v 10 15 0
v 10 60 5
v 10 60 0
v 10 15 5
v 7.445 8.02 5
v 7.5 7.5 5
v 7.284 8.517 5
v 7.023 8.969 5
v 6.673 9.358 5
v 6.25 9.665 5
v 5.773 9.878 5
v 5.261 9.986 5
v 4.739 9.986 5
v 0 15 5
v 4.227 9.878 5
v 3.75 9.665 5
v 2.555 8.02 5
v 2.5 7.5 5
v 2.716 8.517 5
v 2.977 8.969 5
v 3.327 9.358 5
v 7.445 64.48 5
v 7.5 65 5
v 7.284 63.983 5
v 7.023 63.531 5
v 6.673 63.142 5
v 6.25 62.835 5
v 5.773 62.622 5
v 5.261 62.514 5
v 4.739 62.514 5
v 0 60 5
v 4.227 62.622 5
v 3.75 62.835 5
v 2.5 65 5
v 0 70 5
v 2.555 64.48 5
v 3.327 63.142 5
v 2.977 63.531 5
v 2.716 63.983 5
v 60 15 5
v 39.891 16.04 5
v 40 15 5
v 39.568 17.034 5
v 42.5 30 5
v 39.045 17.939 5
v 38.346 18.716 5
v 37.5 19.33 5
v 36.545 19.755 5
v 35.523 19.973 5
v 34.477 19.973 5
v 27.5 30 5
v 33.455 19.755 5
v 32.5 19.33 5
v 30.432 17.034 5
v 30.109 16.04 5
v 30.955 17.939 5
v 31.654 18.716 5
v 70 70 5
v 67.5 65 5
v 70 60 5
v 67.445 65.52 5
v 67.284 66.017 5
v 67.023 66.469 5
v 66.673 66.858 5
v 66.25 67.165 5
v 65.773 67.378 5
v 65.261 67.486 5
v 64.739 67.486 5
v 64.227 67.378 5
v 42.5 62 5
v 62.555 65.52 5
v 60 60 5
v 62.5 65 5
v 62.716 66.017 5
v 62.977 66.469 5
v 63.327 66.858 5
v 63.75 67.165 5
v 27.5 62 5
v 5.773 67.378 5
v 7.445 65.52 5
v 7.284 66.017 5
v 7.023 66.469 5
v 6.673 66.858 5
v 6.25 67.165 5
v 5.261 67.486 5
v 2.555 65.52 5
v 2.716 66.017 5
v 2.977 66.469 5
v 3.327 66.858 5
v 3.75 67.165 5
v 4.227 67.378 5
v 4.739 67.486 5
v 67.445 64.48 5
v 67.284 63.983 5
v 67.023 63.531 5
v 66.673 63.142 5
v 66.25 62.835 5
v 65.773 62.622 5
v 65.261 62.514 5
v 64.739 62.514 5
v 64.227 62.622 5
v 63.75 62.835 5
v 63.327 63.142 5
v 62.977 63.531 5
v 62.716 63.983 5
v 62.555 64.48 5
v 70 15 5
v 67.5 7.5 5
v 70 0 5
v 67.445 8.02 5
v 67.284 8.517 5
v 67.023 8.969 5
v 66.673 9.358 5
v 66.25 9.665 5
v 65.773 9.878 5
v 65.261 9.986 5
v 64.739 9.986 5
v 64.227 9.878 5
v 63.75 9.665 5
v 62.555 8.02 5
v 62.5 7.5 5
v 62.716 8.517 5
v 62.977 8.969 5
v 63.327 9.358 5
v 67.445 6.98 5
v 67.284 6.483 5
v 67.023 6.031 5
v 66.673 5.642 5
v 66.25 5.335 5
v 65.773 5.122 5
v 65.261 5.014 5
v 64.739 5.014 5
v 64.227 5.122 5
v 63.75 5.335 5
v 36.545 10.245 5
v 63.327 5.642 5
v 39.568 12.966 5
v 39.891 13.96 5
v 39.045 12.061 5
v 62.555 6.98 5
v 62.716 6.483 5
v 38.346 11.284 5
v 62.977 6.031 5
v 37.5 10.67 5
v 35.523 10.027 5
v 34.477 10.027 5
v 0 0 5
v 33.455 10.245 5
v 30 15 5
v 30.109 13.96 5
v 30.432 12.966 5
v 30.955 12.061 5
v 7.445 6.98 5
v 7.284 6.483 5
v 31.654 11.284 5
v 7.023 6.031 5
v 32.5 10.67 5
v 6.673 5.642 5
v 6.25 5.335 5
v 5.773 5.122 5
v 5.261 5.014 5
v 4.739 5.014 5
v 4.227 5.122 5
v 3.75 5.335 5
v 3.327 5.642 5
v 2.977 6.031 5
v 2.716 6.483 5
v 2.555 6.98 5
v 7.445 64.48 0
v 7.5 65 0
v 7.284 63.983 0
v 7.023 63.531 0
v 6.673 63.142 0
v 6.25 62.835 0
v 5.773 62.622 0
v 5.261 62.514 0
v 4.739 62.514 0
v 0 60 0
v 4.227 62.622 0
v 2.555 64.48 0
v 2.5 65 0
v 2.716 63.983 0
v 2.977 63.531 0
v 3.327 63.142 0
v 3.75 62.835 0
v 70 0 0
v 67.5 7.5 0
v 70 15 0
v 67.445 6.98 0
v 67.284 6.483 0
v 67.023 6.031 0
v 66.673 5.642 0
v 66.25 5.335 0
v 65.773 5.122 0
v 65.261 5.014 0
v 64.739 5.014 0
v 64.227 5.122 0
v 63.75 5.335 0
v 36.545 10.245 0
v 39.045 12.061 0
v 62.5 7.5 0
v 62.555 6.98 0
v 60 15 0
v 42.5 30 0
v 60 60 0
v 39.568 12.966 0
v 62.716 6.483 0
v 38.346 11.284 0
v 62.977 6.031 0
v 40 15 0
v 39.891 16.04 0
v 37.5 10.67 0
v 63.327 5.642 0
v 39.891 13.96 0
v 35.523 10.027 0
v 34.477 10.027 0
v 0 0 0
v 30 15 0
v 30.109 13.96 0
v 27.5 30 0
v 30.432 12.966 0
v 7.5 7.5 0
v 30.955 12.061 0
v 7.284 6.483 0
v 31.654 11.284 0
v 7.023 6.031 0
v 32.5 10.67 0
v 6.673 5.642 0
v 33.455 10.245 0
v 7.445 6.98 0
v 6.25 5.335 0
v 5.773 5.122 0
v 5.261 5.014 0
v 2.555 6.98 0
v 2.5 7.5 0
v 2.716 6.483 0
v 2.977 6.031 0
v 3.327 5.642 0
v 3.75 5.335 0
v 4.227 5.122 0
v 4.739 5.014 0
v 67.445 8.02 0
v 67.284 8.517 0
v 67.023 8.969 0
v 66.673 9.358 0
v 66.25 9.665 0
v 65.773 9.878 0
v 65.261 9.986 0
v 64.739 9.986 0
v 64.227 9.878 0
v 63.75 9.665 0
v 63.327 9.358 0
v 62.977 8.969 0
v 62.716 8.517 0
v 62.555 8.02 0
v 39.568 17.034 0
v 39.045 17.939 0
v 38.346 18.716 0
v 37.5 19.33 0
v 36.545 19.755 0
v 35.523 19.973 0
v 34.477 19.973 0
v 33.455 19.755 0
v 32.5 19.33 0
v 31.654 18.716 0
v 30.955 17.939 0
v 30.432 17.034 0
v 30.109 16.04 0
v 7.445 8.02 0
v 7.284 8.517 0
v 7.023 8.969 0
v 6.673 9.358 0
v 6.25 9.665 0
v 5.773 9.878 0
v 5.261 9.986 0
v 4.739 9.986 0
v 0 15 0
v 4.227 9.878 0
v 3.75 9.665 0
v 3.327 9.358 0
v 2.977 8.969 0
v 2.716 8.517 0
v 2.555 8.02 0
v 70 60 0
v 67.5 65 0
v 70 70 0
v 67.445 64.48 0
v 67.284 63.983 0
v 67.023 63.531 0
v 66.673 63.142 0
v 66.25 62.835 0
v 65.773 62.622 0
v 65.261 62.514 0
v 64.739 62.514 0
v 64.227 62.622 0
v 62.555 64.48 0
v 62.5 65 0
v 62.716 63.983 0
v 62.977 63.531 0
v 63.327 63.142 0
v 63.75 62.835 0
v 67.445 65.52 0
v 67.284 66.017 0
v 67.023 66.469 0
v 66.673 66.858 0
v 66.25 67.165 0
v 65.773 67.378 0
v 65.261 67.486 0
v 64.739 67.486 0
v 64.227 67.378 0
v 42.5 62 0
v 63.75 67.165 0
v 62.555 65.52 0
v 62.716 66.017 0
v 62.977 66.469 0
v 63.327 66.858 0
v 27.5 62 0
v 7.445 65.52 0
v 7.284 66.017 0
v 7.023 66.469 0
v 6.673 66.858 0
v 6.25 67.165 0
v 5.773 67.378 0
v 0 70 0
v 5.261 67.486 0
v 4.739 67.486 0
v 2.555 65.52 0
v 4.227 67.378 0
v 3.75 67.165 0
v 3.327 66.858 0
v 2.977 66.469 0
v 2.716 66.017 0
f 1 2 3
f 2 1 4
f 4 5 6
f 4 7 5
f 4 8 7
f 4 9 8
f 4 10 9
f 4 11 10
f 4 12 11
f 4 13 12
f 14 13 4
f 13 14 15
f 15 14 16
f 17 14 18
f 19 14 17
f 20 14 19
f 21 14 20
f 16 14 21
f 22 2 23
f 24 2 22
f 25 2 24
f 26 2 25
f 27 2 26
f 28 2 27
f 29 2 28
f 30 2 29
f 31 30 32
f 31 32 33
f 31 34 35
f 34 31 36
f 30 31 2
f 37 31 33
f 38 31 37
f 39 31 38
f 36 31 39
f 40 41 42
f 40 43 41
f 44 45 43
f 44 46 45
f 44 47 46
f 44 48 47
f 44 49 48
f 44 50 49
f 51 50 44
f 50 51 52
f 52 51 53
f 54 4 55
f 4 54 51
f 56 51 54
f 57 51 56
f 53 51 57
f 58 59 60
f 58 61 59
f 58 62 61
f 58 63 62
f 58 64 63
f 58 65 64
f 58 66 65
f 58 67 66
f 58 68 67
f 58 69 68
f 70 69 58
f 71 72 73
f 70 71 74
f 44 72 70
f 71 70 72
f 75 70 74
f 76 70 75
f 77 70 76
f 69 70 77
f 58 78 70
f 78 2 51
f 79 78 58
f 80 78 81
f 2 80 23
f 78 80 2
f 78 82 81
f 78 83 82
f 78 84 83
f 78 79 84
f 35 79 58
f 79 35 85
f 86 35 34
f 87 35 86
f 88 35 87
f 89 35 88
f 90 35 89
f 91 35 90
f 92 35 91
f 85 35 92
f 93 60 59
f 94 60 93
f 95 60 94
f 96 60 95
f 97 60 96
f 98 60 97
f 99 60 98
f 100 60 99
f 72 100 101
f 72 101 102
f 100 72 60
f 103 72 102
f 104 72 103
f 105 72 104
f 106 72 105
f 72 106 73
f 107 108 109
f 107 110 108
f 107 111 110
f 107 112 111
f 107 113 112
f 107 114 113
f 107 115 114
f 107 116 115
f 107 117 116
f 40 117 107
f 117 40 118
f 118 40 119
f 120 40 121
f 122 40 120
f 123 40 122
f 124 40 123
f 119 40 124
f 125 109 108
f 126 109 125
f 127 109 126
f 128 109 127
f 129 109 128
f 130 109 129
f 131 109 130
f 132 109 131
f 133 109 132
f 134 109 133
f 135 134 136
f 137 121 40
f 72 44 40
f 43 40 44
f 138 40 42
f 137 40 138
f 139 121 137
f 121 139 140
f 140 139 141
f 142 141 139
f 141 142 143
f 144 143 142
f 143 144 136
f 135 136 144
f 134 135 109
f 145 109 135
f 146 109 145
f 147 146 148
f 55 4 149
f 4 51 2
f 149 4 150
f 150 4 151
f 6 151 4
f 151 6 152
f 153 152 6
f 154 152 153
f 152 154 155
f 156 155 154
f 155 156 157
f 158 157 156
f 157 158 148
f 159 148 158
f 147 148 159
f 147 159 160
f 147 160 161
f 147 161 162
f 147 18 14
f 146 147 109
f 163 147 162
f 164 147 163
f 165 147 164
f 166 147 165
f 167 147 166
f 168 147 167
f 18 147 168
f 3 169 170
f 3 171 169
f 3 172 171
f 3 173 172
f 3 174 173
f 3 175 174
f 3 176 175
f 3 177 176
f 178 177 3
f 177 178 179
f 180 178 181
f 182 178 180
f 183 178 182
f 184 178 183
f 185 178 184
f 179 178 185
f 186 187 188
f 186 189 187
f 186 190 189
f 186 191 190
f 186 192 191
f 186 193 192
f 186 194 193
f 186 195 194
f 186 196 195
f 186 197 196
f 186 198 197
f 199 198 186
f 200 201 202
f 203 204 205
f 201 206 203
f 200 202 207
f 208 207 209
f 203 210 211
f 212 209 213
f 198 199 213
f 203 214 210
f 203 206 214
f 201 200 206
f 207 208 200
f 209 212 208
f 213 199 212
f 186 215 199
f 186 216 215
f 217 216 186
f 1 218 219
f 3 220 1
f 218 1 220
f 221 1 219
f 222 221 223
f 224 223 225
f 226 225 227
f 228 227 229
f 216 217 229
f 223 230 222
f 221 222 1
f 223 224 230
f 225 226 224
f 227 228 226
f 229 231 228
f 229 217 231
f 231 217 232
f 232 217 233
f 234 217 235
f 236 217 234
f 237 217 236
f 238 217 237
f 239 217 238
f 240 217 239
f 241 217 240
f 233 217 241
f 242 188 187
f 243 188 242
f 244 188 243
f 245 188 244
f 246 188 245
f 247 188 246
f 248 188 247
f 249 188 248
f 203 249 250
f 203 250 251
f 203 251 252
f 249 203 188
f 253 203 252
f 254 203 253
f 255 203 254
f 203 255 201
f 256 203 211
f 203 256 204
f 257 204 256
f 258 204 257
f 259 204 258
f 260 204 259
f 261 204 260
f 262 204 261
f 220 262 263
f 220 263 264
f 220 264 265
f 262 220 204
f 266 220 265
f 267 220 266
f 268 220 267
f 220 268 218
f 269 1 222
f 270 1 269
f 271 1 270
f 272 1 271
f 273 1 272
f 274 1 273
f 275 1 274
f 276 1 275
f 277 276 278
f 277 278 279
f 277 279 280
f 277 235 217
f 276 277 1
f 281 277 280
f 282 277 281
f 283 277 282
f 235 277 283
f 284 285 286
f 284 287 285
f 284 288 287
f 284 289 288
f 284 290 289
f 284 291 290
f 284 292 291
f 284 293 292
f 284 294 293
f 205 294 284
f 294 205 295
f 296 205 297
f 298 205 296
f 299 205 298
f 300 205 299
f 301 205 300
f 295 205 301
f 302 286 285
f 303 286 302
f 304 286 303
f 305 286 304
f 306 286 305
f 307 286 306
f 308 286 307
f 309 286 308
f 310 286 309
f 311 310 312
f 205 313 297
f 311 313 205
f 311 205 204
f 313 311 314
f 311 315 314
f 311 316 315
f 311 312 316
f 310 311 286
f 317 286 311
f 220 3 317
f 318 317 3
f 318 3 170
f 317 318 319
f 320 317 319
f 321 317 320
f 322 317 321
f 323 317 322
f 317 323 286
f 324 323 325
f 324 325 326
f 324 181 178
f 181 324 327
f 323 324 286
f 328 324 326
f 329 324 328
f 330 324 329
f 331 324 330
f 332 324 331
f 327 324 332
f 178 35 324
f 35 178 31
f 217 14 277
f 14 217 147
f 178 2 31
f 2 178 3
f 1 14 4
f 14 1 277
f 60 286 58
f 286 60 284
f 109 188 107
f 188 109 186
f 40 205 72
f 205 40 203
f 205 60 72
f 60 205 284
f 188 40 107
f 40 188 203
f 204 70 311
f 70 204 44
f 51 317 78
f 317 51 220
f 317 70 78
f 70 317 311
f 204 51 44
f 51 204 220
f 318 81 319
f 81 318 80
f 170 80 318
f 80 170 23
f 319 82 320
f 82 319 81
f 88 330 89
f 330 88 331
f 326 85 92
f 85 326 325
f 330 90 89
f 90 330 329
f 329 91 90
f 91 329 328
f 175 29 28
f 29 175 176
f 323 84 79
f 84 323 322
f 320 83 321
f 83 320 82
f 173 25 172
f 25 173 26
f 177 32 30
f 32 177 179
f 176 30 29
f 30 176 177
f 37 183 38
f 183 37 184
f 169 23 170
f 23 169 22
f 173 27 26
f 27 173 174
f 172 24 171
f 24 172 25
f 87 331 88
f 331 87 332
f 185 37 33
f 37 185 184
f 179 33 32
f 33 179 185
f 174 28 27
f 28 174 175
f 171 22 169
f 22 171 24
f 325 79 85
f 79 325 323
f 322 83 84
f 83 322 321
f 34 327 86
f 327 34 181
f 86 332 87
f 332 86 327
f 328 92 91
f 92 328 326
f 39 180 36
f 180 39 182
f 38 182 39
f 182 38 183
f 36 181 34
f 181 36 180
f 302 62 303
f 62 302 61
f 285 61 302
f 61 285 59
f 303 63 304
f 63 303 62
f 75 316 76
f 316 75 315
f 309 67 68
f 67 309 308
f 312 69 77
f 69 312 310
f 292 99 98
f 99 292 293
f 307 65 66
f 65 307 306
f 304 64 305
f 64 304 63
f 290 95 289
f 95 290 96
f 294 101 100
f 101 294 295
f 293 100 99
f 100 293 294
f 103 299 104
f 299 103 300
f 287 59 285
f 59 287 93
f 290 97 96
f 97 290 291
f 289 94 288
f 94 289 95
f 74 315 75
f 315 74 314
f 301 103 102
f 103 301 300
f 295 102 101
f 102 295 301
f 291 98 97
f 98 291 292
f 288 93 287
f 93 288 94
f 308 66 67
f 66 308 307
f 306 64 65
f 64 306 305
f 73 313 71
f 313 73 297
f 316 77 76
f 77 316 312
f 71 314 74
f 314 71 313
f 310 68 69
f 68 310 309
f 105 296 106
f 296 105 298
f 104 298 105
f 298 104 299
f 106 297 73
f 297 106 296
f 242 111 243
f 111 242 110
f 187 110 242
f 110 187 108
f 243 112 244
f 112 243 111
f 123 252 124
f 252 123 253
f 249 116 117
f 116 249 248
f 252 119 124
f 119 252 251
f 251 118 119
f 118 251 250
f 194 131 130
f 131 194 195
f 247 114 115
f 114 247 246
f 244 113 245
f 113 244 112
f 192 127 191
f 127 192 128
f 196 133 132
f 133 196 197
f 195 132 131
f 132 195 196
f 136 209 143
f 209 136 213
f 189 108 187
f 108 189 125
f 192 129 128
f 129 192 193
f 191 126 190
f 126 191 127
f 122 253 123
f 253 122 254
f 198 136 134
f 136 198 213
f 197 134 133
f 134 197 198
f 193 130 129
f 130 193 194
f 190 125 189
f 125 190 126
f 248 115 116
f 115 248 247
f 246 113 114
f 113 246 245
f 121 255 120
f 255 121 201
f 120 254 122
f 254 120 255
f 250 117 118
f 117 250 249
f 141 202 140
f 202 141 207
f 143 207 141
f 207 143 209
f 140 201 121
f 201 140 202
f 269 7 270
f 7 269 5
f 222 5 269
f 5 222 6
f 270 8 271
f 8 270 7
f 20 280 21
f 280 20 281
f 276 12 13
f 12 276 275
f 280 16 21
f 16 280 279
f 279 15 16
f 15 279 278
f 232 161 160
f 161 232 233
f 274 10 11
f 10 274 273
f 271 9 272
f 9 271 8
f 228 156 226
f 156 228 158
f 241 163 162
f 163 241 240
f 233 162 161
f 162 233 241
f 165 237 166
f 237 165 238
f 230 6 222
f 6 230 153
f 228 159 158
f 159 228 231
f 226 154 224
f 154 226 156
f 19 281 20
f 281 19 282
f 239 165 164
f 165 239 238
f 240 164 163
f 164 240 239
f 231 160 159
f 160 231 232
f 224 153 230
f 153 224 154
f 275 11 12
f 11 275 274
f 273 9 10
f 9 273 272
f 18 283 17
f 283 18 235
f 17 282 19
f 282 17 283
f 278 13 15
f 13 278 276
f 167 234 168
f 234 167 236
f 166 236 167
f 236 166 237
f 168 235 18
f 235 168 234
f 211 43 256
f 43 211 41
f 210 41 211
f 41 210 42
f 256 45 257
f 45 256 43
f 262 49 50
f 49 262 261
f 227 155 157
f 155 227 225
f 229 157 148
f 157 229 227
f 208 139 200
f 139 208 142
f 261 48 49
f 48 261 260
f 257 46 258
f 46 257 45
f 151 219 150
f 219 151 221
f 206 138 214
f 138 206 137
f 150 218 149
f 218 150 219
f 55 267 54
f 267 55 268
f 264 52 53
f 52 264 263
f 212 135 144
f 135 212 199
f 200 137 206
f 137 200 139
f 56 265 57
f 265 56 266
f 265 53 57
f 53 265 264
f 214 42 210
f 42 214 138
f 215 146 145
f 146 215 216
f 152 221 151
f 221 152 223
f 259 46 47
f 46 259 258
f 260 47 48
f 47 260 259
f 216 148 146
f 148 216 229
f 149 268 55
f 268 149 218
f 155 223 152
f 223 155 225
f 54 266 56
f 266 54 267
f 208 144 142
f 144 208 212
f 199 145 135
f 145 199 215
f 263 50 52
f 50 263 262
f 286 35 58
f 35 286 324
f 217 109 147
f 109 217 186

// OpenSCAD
$fn = 30; // number of faces in screw holes

thickness = 5; // thickness, this doesnt work

// main body
width = 70;
depth = 70;
height = 32;

// servo
sWidth = 15;
sDepth = 32;
sHeight = 5;

cWidth = 10; // cutout width

sDiameter = 5; // screw diameter

rDiameter  = 10; //rudder rod diameter (readjust)

// top surface
difference()
{
    // main
    cube([width, depth, thickness]);    
    
      union()
    {
        // edge cutout
        translate([0, 10+thickness, 0])
        cube([cWidth, 45, thickness]);
        
         // edge cutout
        translate([width-cWidth, 10+thickness, 0])
        cube([cWidth, 45, thickness]);
        
        // servo hole
        translate([(width/2)-(sWidth/2), 30, 0])
        cube([sWidth, sDepth, sHeight]);
        
        // screw holes
        
        // upper left
        translate([cWidth/2, width-cWidth/2, 0])
        cylinder(h=thickness, d=sDiameter);
        // upper right
        translate([depth-cWidth/2, width-cWidth/2, 0])
        cylinder(h=thickness, d=sDiameter);
        
       
        // lower right
        translate([depth-cWidth/2, cWidth-2.5, 0])
        cylinder(h=thickness, d=sDiameter);
        // lower left
        translate([cWidth/2, cWidth-2.5, 0])
        cylinder(h=thickness, d=sDiameter);
        
        
        //rudder hole
        translate([(width/2),15,0])
        cylinder(h=thickness,d=rDiameter);
    }
}
